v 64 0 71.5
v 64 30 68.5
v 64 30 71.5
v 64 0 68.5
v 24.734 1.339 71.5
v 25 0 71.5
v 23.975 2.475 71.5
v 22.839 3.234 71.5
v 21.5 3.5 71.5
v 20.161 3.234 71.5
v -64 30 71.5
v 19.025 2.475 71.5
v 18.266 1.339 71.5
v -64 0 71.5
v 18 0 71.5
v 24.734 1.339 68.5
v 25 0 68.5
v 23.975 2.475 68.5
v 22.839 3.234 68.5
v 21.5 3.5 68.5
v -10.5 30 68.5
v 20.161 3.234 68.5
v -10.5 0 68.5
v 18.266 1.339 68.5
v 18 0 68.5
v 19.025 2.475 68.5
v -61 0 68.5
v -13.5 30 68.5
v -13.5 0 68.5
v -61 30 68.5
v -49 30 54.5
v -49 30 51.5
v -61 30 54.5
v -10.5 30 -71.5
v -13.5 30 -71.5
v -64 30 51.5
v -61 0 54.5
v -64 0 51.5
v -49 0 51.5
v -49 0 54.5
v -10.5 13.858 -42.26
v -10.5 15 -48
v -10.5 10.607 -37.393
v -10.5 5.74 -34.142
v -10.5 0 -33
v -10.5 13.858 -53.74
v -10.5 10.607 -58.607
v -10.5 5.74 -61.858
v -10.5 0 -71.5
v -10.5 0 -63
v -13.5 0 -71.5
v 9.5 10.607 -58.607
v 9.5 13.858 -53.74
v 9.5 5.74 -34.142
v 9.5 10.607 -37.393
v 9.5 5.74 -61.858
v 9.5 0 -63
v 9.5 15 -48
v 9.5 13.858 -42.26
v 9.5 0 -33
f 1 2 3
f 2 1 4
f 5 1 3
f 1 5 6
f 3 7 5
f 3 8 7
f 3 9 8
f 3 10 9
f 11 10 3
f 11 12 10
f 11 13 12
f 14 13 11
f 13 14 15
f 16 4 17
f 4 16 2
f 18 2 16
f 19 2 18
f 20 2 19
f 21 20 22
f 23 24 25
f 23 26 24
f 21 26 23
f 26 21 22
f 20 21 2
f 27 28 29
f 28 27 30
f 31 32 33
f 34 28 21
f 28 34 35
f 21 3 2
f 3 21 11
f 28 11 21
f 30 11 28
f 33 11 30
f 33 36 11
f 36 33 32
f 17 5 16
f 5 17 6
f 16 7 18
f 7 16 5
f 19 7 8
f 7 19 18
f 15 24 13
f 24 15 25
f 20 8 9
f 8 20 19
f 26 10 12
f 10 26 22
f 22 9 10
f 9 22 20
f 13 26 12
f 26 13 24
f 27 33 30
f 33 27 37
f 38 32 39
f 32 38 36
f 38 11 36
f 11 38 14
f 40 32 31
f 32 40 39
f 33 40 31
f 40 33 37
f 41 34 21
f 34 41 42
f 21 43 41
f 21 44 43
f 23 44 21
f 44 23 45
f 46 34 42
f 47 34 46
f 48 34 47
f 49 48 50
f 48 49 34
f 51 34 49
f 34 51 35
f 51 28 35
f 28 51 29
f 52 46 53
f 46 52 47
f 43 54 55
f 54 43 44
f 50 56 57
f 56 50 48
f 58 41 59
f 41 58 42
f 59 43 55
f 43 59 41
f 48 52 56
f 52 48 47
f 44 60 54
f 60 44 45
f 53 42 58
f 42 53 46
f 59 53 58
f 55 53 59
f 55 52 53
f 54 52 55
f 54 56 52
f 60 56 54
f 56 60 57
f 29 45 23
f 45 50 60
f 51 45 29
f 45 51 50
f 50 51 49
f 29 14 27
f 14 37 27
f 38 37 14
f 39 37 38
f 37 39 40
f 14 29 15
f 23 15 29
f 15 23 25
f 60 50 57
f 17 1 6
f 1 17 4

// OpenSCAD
module mount() {
    translate([0,0,8])
        cube([45,60,3], center=true);

    translate([-45/2-1.5,0,-0.5])
        cube([3,60,20], center=true);

    translate([-18,0,-9])
        cube([15,60,3], center=true);

    translate([45/2+4,0,-63-0.5])
        cube([3,60,140], center=true);

    difference() {
    translate([45/2+80/2,0,8])
        cube([80,60,3], center=true);

    translate([60,0,8])
        cylinder(d=7, h=10, center=true, $fn=16);
    }

    translate([38,0,-110])
        rotate([0,90,0])
            cylinder(d=30, h=20, center=true, $fn=16);
}

module right_printer_wall() {
    translate([0,0,0])
        cube([42.6,500,13], center=true);
    translate([21.3-2.5,0,-250])
        cube([5,500,500], center=true);
}

module fillament() {
translate([60,0,-100])
    rotate([0,90,0]) {
        difference() {
            cylinder(h=60, d=200, center=true, $fn=32);
            cylinder(h=60.1, d=56, center=true, $fn=32);
        }
    }
}

module frontcut() {
    intersection() {
        translate([0,-500,0])
            cube([1000,1000,1000], center=true);
        children();
    }
}

module backcut() {
    intersection() {
        translate([0,500,0])
            cube([1000,1000,1000], center=true);
        children();
    }
}

/*    
color("blue")
    translate([0,-110,0])
        fillament();

color("blue")
    translate([0,110,0])
        fillament();


color("gray")
    right_printer_wall();
*/

//translate([0,110,0])
//    mount();

//translate([0,-110,0])
//    mount();



//color("white", alpha=0.5)
//    cube([128,60,143], center=true)
/*
frontcut() {
    translate([-38.5,0,62])
        mount();
}
*/

backcut() {
    translate([-38.5,0,62])
        mount();
}
